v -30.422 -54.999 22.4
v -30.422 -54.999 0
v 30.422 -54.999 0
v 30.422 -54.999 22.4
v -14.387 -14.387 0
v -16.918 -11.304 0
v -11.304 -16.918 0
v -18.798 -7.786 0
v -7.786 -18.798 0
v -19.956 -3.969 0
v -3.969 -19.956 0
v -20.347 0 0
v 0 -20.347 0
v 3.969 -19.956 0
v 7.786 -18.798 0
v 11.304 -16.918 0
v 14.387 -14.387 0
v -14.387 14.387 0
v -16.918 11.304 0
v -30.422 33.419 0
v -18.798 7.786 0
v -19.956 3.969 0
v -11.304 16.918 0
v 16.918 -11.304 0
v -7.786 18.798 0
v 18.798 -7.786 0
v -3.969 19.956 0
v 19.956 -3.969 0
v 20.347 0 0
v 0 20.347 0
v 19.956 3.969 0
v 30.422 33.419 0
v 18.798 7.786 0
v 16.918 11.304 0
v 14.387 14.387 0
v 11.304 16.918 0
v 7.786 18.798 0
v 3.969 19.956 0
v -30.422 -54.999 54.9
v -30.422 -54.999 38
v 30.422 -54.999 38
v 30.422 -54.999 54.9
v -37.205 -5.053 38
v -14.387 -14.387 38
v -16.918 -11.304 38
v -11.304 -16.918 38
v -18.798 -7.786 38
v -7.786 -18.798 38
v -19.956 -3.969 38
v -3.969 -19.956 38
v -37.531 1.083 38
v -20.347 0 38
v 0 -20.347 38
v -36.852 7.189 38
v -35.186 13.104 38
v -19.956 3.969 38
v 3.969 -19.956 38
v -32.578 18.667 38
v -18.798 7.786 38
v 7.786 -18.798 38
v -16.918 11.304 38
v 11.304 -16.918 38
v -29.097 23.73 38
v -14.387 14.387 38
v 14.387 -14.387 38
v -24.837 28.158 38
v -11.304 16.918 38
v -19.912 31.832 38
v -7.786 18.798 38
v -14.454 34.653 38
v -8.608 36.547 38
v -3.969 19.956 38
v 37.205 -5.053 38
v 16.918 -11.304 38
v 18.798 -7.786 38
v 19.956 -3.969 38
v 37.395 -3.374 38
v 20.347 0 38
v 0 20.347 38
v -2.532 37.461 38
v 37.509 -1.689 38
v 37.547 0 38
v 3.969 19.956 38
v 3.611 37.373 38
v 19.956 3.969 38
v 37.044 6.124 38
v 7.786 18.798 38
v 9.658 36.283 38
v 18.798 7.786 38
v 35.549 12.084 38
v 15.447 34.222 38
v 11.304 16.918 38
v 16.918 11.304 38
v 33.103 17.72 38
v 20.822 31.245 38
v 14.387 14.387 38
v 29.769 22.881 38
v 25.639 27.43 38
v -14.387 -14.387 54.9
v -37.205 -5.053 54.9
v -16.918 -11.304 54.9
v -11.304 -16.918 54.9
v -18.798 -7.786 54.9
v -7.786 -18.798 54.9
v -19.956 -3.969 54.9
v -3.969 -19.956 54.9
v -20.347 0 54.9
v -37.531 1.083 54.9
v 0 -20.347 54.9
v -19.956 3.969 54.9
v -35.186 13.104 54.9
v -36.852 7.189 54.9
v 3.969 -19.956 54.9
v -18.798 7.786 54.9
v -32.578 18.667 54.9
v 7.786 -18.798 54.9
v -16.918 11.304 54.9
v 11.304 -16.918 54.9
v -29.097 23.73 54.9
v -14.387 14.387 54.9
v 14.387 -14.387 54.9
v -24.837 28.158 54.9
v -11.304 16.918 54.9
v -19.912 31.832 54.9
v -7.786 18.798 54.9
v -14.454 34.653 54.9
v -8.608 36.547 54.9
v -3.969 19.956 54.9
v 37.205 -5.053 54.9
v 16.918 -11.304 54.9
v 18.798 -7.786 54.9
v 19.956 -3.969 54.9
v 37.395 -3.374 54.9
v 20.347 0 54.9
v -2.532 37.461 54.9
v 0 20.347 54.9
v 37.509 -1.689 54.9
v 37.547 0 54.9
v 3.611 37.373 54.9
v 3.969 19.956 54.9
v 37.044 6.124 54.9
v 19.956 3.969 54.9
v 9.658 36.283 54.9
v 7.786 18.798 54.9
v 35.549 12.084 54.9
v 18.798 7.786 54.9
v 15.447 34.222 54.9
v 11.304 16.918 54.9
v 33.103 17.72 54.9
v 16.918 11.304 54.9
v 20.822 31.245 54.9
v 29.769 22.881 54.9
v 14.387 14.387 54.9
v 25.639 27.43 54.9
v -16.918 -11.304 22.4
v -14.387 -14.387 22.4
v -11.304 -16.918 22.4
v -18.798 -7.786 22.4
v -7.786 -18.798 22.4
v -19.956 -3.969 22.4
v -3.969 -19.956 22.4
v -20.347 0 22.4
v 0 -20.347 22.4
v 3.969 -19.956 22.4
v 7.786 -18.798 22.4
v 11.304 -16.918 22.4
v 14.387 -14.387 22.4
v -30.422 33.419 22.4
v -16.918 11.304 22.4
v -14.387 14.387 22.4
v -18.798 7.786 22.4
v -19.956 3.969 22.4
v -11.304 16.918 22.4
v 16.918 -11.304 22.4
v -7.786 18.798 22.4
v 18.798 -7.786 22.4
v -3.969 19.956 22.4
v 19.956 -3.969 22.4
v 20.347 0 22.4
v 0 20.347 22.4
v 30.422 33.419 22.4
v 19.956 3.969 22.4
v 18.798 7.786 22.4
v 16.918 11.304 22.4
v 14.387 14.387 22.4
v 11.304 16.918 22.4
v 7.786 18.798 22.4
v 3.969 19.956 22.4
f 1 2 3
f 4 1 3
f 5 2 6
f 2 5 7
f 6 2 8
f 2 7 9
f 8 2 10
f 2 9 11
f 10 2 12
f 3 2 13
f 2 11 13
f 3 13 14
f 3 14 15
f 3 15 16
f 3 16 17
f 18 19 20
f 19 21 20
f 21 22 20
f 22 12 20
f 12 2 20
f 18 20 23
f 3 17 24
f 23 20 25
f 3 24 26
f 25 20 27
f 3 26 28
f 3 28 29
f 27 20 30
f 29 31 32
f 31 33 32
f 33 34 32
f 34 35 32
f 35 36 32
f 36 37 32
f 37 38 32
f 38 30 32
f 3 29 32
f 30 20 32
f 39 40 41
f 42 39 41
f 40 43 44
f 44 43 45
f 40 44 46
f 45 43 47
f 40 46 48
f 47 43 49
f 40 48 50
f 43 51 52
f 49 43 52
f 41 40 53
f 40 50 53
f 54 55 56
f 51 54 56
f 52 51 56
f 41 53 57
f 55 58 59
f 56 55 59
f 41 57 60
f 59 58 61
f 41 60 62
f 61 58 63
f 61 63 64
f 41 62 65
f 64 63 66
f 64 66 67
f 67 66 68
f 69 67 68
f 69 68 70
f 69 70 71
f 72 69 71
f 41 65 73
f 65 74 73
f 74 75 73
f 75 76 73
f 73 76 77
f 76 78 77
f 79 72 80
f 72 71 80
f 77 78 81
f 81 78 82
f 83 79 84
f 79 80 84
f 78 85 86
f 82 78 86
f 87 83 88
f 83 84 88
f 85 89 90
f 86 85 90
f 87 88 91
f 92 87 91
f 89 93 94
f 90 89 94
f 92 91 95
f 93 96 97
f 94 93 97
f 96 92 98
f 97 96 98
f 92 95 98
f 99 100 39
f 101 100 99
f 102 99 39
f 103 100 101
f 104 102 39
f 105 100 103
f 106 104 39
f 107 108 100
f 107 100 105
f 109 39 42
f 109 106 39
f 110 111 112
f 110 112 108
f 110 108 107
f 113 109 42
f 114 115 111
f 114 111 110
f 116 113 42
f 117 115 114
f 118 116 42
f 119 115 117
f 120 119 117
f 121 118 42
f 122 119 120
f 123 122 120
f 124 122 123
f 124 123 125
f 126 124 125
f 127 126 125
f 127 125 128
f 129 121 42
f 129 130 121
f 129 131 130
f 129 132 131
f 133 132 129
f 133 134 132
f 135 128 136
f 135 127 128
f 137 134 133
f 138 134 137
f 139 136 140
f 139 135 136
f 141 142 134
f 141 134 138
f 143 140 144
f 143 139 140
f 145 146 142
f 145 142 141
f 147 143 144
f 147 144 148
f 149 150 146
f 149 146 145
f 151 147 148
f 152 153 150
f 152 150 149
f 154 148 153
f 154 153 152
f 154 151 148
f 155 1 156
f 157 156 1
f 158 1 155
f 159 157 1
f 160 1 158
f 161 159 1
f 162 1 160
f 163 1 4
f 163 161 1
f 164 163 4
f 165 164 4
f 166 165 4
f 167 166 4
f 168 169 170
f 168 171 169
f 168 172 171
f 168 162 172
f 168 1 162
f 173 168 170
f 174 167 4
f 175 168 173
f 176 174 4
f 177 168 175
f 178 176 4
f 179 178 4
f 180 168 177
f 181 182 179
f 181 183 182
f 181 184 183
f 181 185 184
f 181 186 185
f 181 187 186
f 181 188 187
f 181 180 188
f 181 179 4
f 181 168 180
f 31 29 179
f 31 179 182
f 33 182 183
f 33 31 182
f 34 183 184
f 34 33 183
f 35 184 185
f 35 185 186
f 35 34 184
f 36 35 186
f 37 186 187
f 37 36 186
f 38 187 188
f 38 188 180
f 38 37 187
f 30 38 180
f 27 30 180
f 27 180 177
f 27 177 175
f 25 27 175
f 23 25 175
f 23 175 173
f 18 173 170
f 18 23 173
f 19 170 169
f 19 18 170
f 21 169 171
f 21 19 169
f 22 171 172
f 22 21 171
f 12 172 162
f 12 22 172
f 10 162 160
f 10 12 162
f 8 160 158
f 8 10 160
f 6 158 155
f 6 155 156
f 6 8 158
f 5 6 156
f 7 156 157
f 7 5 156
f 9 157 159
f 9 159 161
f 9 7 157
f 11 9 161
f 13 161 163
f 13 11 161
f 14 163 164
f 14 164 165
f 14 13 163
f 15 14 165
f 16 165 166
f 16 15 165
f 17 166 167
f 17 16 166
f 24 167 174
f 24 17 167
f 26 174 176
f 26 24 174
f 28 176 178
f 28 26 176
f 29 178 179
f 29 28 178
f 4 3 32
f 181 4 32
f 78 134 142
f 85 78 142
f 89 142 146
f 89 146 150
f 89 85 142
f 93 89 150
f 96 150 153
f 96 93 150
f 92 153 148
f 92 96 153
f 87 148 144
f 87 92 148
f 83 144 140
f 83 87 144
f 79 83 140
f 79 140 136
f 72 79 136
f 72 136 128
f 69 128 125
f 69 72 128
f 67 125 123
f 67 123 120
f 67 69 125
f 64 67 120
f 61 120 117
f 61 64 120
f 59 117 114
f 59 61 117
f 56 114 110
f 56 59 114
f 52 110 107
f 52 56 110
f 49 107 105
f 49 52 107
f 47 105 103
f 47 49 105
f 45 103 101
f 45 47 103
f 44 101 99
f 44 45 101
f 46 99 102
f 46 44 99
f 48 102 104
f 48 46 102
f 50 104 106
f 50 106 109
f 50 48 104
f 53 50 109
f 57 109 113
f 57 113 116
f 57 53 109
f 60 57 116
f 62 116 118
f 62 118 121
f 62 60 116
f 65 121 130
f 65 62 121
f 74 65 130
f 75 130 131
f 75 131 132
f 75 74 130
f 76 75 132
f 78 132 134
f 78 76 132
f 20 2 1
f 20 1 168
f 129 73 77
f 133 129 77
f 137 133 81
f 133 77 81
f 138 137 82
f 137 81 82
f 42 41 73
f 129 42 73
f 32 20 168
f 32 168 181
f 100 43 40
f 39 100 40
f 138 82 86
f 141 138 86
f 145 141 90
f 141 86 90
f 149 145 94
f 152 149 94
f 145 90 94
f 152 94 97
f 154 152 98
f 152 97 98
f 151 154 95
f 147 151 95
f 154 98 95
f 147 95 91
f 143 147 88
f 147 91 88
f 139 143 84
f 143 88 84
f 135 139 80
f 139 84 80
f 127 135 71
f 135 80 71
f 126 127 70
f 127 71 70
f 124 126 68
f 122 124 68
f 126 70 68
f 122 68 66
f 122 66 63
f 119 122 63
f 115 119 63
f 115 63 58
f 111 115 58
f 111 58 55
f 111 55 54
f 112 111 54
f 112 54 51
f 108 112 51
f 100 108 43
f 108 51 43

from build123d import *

# Parameters (mm, degrees)
F0_W     = 60.8435235918
F0_H     = 88.41791749
F0_R     = 20.346896913
F1_DEPTH = 22.4
F3_START = 38
F2_R     = 20.346896913
F3_DEPTH = 16.9


with BuildPart() as f1:
    # F0 (on Top) → F1 (new body)
    with BuildSketch(Plane.XY):
        with Locations((0, -10.7899829745)):
            Rectangle(F0_W, F0_H)
        Circle(F0_R, mode=Mode.SUBTRACT)
    extrude(amount=F1_DEPTH)


with BuildPart() as f3:
    # F2 (on Top) → F3 (new body)
    with BuildSketch(Plane.XY.offset(F3_START)):
        with BuildLine():
            ThreePointArc((37.2053081278, -5.0531578866), (37.4614012803, -2.5323450852), (37.5468954444, 0))
            ThreePointArc((37.5468954444, 0), (-2.5323450852, 37.4614012803), (-37.2053081278, -5.0531578866))
            ThreePointArc((-37.2053081278, -5.0531578866), (0, -37.5468954444), (37.2053081278, -5.0531578866))
        make_face()
        Circle(F2_R, mode=Mode.SUBTRACT)
        with BuildLine():
            ThreePointArc((37.2053081278, -5.0531578866), (0, -37.5468954444), (-37.2053081278, -5.0531578866))
            Line((-37.2053081278, -5.0531578866), (-30.4217617959, -54.9989417195))
            Line((-30.4217617959, -54.9989417195), (30.4217617959, -54.9989417195))
            Line((30.4217617959, -54.9989417195), (37.2053081278, -5.0531578866))
        make_face()
    extrude(amount=F3_DEPTH)


solid = Compound([f1.part, f3.part])
